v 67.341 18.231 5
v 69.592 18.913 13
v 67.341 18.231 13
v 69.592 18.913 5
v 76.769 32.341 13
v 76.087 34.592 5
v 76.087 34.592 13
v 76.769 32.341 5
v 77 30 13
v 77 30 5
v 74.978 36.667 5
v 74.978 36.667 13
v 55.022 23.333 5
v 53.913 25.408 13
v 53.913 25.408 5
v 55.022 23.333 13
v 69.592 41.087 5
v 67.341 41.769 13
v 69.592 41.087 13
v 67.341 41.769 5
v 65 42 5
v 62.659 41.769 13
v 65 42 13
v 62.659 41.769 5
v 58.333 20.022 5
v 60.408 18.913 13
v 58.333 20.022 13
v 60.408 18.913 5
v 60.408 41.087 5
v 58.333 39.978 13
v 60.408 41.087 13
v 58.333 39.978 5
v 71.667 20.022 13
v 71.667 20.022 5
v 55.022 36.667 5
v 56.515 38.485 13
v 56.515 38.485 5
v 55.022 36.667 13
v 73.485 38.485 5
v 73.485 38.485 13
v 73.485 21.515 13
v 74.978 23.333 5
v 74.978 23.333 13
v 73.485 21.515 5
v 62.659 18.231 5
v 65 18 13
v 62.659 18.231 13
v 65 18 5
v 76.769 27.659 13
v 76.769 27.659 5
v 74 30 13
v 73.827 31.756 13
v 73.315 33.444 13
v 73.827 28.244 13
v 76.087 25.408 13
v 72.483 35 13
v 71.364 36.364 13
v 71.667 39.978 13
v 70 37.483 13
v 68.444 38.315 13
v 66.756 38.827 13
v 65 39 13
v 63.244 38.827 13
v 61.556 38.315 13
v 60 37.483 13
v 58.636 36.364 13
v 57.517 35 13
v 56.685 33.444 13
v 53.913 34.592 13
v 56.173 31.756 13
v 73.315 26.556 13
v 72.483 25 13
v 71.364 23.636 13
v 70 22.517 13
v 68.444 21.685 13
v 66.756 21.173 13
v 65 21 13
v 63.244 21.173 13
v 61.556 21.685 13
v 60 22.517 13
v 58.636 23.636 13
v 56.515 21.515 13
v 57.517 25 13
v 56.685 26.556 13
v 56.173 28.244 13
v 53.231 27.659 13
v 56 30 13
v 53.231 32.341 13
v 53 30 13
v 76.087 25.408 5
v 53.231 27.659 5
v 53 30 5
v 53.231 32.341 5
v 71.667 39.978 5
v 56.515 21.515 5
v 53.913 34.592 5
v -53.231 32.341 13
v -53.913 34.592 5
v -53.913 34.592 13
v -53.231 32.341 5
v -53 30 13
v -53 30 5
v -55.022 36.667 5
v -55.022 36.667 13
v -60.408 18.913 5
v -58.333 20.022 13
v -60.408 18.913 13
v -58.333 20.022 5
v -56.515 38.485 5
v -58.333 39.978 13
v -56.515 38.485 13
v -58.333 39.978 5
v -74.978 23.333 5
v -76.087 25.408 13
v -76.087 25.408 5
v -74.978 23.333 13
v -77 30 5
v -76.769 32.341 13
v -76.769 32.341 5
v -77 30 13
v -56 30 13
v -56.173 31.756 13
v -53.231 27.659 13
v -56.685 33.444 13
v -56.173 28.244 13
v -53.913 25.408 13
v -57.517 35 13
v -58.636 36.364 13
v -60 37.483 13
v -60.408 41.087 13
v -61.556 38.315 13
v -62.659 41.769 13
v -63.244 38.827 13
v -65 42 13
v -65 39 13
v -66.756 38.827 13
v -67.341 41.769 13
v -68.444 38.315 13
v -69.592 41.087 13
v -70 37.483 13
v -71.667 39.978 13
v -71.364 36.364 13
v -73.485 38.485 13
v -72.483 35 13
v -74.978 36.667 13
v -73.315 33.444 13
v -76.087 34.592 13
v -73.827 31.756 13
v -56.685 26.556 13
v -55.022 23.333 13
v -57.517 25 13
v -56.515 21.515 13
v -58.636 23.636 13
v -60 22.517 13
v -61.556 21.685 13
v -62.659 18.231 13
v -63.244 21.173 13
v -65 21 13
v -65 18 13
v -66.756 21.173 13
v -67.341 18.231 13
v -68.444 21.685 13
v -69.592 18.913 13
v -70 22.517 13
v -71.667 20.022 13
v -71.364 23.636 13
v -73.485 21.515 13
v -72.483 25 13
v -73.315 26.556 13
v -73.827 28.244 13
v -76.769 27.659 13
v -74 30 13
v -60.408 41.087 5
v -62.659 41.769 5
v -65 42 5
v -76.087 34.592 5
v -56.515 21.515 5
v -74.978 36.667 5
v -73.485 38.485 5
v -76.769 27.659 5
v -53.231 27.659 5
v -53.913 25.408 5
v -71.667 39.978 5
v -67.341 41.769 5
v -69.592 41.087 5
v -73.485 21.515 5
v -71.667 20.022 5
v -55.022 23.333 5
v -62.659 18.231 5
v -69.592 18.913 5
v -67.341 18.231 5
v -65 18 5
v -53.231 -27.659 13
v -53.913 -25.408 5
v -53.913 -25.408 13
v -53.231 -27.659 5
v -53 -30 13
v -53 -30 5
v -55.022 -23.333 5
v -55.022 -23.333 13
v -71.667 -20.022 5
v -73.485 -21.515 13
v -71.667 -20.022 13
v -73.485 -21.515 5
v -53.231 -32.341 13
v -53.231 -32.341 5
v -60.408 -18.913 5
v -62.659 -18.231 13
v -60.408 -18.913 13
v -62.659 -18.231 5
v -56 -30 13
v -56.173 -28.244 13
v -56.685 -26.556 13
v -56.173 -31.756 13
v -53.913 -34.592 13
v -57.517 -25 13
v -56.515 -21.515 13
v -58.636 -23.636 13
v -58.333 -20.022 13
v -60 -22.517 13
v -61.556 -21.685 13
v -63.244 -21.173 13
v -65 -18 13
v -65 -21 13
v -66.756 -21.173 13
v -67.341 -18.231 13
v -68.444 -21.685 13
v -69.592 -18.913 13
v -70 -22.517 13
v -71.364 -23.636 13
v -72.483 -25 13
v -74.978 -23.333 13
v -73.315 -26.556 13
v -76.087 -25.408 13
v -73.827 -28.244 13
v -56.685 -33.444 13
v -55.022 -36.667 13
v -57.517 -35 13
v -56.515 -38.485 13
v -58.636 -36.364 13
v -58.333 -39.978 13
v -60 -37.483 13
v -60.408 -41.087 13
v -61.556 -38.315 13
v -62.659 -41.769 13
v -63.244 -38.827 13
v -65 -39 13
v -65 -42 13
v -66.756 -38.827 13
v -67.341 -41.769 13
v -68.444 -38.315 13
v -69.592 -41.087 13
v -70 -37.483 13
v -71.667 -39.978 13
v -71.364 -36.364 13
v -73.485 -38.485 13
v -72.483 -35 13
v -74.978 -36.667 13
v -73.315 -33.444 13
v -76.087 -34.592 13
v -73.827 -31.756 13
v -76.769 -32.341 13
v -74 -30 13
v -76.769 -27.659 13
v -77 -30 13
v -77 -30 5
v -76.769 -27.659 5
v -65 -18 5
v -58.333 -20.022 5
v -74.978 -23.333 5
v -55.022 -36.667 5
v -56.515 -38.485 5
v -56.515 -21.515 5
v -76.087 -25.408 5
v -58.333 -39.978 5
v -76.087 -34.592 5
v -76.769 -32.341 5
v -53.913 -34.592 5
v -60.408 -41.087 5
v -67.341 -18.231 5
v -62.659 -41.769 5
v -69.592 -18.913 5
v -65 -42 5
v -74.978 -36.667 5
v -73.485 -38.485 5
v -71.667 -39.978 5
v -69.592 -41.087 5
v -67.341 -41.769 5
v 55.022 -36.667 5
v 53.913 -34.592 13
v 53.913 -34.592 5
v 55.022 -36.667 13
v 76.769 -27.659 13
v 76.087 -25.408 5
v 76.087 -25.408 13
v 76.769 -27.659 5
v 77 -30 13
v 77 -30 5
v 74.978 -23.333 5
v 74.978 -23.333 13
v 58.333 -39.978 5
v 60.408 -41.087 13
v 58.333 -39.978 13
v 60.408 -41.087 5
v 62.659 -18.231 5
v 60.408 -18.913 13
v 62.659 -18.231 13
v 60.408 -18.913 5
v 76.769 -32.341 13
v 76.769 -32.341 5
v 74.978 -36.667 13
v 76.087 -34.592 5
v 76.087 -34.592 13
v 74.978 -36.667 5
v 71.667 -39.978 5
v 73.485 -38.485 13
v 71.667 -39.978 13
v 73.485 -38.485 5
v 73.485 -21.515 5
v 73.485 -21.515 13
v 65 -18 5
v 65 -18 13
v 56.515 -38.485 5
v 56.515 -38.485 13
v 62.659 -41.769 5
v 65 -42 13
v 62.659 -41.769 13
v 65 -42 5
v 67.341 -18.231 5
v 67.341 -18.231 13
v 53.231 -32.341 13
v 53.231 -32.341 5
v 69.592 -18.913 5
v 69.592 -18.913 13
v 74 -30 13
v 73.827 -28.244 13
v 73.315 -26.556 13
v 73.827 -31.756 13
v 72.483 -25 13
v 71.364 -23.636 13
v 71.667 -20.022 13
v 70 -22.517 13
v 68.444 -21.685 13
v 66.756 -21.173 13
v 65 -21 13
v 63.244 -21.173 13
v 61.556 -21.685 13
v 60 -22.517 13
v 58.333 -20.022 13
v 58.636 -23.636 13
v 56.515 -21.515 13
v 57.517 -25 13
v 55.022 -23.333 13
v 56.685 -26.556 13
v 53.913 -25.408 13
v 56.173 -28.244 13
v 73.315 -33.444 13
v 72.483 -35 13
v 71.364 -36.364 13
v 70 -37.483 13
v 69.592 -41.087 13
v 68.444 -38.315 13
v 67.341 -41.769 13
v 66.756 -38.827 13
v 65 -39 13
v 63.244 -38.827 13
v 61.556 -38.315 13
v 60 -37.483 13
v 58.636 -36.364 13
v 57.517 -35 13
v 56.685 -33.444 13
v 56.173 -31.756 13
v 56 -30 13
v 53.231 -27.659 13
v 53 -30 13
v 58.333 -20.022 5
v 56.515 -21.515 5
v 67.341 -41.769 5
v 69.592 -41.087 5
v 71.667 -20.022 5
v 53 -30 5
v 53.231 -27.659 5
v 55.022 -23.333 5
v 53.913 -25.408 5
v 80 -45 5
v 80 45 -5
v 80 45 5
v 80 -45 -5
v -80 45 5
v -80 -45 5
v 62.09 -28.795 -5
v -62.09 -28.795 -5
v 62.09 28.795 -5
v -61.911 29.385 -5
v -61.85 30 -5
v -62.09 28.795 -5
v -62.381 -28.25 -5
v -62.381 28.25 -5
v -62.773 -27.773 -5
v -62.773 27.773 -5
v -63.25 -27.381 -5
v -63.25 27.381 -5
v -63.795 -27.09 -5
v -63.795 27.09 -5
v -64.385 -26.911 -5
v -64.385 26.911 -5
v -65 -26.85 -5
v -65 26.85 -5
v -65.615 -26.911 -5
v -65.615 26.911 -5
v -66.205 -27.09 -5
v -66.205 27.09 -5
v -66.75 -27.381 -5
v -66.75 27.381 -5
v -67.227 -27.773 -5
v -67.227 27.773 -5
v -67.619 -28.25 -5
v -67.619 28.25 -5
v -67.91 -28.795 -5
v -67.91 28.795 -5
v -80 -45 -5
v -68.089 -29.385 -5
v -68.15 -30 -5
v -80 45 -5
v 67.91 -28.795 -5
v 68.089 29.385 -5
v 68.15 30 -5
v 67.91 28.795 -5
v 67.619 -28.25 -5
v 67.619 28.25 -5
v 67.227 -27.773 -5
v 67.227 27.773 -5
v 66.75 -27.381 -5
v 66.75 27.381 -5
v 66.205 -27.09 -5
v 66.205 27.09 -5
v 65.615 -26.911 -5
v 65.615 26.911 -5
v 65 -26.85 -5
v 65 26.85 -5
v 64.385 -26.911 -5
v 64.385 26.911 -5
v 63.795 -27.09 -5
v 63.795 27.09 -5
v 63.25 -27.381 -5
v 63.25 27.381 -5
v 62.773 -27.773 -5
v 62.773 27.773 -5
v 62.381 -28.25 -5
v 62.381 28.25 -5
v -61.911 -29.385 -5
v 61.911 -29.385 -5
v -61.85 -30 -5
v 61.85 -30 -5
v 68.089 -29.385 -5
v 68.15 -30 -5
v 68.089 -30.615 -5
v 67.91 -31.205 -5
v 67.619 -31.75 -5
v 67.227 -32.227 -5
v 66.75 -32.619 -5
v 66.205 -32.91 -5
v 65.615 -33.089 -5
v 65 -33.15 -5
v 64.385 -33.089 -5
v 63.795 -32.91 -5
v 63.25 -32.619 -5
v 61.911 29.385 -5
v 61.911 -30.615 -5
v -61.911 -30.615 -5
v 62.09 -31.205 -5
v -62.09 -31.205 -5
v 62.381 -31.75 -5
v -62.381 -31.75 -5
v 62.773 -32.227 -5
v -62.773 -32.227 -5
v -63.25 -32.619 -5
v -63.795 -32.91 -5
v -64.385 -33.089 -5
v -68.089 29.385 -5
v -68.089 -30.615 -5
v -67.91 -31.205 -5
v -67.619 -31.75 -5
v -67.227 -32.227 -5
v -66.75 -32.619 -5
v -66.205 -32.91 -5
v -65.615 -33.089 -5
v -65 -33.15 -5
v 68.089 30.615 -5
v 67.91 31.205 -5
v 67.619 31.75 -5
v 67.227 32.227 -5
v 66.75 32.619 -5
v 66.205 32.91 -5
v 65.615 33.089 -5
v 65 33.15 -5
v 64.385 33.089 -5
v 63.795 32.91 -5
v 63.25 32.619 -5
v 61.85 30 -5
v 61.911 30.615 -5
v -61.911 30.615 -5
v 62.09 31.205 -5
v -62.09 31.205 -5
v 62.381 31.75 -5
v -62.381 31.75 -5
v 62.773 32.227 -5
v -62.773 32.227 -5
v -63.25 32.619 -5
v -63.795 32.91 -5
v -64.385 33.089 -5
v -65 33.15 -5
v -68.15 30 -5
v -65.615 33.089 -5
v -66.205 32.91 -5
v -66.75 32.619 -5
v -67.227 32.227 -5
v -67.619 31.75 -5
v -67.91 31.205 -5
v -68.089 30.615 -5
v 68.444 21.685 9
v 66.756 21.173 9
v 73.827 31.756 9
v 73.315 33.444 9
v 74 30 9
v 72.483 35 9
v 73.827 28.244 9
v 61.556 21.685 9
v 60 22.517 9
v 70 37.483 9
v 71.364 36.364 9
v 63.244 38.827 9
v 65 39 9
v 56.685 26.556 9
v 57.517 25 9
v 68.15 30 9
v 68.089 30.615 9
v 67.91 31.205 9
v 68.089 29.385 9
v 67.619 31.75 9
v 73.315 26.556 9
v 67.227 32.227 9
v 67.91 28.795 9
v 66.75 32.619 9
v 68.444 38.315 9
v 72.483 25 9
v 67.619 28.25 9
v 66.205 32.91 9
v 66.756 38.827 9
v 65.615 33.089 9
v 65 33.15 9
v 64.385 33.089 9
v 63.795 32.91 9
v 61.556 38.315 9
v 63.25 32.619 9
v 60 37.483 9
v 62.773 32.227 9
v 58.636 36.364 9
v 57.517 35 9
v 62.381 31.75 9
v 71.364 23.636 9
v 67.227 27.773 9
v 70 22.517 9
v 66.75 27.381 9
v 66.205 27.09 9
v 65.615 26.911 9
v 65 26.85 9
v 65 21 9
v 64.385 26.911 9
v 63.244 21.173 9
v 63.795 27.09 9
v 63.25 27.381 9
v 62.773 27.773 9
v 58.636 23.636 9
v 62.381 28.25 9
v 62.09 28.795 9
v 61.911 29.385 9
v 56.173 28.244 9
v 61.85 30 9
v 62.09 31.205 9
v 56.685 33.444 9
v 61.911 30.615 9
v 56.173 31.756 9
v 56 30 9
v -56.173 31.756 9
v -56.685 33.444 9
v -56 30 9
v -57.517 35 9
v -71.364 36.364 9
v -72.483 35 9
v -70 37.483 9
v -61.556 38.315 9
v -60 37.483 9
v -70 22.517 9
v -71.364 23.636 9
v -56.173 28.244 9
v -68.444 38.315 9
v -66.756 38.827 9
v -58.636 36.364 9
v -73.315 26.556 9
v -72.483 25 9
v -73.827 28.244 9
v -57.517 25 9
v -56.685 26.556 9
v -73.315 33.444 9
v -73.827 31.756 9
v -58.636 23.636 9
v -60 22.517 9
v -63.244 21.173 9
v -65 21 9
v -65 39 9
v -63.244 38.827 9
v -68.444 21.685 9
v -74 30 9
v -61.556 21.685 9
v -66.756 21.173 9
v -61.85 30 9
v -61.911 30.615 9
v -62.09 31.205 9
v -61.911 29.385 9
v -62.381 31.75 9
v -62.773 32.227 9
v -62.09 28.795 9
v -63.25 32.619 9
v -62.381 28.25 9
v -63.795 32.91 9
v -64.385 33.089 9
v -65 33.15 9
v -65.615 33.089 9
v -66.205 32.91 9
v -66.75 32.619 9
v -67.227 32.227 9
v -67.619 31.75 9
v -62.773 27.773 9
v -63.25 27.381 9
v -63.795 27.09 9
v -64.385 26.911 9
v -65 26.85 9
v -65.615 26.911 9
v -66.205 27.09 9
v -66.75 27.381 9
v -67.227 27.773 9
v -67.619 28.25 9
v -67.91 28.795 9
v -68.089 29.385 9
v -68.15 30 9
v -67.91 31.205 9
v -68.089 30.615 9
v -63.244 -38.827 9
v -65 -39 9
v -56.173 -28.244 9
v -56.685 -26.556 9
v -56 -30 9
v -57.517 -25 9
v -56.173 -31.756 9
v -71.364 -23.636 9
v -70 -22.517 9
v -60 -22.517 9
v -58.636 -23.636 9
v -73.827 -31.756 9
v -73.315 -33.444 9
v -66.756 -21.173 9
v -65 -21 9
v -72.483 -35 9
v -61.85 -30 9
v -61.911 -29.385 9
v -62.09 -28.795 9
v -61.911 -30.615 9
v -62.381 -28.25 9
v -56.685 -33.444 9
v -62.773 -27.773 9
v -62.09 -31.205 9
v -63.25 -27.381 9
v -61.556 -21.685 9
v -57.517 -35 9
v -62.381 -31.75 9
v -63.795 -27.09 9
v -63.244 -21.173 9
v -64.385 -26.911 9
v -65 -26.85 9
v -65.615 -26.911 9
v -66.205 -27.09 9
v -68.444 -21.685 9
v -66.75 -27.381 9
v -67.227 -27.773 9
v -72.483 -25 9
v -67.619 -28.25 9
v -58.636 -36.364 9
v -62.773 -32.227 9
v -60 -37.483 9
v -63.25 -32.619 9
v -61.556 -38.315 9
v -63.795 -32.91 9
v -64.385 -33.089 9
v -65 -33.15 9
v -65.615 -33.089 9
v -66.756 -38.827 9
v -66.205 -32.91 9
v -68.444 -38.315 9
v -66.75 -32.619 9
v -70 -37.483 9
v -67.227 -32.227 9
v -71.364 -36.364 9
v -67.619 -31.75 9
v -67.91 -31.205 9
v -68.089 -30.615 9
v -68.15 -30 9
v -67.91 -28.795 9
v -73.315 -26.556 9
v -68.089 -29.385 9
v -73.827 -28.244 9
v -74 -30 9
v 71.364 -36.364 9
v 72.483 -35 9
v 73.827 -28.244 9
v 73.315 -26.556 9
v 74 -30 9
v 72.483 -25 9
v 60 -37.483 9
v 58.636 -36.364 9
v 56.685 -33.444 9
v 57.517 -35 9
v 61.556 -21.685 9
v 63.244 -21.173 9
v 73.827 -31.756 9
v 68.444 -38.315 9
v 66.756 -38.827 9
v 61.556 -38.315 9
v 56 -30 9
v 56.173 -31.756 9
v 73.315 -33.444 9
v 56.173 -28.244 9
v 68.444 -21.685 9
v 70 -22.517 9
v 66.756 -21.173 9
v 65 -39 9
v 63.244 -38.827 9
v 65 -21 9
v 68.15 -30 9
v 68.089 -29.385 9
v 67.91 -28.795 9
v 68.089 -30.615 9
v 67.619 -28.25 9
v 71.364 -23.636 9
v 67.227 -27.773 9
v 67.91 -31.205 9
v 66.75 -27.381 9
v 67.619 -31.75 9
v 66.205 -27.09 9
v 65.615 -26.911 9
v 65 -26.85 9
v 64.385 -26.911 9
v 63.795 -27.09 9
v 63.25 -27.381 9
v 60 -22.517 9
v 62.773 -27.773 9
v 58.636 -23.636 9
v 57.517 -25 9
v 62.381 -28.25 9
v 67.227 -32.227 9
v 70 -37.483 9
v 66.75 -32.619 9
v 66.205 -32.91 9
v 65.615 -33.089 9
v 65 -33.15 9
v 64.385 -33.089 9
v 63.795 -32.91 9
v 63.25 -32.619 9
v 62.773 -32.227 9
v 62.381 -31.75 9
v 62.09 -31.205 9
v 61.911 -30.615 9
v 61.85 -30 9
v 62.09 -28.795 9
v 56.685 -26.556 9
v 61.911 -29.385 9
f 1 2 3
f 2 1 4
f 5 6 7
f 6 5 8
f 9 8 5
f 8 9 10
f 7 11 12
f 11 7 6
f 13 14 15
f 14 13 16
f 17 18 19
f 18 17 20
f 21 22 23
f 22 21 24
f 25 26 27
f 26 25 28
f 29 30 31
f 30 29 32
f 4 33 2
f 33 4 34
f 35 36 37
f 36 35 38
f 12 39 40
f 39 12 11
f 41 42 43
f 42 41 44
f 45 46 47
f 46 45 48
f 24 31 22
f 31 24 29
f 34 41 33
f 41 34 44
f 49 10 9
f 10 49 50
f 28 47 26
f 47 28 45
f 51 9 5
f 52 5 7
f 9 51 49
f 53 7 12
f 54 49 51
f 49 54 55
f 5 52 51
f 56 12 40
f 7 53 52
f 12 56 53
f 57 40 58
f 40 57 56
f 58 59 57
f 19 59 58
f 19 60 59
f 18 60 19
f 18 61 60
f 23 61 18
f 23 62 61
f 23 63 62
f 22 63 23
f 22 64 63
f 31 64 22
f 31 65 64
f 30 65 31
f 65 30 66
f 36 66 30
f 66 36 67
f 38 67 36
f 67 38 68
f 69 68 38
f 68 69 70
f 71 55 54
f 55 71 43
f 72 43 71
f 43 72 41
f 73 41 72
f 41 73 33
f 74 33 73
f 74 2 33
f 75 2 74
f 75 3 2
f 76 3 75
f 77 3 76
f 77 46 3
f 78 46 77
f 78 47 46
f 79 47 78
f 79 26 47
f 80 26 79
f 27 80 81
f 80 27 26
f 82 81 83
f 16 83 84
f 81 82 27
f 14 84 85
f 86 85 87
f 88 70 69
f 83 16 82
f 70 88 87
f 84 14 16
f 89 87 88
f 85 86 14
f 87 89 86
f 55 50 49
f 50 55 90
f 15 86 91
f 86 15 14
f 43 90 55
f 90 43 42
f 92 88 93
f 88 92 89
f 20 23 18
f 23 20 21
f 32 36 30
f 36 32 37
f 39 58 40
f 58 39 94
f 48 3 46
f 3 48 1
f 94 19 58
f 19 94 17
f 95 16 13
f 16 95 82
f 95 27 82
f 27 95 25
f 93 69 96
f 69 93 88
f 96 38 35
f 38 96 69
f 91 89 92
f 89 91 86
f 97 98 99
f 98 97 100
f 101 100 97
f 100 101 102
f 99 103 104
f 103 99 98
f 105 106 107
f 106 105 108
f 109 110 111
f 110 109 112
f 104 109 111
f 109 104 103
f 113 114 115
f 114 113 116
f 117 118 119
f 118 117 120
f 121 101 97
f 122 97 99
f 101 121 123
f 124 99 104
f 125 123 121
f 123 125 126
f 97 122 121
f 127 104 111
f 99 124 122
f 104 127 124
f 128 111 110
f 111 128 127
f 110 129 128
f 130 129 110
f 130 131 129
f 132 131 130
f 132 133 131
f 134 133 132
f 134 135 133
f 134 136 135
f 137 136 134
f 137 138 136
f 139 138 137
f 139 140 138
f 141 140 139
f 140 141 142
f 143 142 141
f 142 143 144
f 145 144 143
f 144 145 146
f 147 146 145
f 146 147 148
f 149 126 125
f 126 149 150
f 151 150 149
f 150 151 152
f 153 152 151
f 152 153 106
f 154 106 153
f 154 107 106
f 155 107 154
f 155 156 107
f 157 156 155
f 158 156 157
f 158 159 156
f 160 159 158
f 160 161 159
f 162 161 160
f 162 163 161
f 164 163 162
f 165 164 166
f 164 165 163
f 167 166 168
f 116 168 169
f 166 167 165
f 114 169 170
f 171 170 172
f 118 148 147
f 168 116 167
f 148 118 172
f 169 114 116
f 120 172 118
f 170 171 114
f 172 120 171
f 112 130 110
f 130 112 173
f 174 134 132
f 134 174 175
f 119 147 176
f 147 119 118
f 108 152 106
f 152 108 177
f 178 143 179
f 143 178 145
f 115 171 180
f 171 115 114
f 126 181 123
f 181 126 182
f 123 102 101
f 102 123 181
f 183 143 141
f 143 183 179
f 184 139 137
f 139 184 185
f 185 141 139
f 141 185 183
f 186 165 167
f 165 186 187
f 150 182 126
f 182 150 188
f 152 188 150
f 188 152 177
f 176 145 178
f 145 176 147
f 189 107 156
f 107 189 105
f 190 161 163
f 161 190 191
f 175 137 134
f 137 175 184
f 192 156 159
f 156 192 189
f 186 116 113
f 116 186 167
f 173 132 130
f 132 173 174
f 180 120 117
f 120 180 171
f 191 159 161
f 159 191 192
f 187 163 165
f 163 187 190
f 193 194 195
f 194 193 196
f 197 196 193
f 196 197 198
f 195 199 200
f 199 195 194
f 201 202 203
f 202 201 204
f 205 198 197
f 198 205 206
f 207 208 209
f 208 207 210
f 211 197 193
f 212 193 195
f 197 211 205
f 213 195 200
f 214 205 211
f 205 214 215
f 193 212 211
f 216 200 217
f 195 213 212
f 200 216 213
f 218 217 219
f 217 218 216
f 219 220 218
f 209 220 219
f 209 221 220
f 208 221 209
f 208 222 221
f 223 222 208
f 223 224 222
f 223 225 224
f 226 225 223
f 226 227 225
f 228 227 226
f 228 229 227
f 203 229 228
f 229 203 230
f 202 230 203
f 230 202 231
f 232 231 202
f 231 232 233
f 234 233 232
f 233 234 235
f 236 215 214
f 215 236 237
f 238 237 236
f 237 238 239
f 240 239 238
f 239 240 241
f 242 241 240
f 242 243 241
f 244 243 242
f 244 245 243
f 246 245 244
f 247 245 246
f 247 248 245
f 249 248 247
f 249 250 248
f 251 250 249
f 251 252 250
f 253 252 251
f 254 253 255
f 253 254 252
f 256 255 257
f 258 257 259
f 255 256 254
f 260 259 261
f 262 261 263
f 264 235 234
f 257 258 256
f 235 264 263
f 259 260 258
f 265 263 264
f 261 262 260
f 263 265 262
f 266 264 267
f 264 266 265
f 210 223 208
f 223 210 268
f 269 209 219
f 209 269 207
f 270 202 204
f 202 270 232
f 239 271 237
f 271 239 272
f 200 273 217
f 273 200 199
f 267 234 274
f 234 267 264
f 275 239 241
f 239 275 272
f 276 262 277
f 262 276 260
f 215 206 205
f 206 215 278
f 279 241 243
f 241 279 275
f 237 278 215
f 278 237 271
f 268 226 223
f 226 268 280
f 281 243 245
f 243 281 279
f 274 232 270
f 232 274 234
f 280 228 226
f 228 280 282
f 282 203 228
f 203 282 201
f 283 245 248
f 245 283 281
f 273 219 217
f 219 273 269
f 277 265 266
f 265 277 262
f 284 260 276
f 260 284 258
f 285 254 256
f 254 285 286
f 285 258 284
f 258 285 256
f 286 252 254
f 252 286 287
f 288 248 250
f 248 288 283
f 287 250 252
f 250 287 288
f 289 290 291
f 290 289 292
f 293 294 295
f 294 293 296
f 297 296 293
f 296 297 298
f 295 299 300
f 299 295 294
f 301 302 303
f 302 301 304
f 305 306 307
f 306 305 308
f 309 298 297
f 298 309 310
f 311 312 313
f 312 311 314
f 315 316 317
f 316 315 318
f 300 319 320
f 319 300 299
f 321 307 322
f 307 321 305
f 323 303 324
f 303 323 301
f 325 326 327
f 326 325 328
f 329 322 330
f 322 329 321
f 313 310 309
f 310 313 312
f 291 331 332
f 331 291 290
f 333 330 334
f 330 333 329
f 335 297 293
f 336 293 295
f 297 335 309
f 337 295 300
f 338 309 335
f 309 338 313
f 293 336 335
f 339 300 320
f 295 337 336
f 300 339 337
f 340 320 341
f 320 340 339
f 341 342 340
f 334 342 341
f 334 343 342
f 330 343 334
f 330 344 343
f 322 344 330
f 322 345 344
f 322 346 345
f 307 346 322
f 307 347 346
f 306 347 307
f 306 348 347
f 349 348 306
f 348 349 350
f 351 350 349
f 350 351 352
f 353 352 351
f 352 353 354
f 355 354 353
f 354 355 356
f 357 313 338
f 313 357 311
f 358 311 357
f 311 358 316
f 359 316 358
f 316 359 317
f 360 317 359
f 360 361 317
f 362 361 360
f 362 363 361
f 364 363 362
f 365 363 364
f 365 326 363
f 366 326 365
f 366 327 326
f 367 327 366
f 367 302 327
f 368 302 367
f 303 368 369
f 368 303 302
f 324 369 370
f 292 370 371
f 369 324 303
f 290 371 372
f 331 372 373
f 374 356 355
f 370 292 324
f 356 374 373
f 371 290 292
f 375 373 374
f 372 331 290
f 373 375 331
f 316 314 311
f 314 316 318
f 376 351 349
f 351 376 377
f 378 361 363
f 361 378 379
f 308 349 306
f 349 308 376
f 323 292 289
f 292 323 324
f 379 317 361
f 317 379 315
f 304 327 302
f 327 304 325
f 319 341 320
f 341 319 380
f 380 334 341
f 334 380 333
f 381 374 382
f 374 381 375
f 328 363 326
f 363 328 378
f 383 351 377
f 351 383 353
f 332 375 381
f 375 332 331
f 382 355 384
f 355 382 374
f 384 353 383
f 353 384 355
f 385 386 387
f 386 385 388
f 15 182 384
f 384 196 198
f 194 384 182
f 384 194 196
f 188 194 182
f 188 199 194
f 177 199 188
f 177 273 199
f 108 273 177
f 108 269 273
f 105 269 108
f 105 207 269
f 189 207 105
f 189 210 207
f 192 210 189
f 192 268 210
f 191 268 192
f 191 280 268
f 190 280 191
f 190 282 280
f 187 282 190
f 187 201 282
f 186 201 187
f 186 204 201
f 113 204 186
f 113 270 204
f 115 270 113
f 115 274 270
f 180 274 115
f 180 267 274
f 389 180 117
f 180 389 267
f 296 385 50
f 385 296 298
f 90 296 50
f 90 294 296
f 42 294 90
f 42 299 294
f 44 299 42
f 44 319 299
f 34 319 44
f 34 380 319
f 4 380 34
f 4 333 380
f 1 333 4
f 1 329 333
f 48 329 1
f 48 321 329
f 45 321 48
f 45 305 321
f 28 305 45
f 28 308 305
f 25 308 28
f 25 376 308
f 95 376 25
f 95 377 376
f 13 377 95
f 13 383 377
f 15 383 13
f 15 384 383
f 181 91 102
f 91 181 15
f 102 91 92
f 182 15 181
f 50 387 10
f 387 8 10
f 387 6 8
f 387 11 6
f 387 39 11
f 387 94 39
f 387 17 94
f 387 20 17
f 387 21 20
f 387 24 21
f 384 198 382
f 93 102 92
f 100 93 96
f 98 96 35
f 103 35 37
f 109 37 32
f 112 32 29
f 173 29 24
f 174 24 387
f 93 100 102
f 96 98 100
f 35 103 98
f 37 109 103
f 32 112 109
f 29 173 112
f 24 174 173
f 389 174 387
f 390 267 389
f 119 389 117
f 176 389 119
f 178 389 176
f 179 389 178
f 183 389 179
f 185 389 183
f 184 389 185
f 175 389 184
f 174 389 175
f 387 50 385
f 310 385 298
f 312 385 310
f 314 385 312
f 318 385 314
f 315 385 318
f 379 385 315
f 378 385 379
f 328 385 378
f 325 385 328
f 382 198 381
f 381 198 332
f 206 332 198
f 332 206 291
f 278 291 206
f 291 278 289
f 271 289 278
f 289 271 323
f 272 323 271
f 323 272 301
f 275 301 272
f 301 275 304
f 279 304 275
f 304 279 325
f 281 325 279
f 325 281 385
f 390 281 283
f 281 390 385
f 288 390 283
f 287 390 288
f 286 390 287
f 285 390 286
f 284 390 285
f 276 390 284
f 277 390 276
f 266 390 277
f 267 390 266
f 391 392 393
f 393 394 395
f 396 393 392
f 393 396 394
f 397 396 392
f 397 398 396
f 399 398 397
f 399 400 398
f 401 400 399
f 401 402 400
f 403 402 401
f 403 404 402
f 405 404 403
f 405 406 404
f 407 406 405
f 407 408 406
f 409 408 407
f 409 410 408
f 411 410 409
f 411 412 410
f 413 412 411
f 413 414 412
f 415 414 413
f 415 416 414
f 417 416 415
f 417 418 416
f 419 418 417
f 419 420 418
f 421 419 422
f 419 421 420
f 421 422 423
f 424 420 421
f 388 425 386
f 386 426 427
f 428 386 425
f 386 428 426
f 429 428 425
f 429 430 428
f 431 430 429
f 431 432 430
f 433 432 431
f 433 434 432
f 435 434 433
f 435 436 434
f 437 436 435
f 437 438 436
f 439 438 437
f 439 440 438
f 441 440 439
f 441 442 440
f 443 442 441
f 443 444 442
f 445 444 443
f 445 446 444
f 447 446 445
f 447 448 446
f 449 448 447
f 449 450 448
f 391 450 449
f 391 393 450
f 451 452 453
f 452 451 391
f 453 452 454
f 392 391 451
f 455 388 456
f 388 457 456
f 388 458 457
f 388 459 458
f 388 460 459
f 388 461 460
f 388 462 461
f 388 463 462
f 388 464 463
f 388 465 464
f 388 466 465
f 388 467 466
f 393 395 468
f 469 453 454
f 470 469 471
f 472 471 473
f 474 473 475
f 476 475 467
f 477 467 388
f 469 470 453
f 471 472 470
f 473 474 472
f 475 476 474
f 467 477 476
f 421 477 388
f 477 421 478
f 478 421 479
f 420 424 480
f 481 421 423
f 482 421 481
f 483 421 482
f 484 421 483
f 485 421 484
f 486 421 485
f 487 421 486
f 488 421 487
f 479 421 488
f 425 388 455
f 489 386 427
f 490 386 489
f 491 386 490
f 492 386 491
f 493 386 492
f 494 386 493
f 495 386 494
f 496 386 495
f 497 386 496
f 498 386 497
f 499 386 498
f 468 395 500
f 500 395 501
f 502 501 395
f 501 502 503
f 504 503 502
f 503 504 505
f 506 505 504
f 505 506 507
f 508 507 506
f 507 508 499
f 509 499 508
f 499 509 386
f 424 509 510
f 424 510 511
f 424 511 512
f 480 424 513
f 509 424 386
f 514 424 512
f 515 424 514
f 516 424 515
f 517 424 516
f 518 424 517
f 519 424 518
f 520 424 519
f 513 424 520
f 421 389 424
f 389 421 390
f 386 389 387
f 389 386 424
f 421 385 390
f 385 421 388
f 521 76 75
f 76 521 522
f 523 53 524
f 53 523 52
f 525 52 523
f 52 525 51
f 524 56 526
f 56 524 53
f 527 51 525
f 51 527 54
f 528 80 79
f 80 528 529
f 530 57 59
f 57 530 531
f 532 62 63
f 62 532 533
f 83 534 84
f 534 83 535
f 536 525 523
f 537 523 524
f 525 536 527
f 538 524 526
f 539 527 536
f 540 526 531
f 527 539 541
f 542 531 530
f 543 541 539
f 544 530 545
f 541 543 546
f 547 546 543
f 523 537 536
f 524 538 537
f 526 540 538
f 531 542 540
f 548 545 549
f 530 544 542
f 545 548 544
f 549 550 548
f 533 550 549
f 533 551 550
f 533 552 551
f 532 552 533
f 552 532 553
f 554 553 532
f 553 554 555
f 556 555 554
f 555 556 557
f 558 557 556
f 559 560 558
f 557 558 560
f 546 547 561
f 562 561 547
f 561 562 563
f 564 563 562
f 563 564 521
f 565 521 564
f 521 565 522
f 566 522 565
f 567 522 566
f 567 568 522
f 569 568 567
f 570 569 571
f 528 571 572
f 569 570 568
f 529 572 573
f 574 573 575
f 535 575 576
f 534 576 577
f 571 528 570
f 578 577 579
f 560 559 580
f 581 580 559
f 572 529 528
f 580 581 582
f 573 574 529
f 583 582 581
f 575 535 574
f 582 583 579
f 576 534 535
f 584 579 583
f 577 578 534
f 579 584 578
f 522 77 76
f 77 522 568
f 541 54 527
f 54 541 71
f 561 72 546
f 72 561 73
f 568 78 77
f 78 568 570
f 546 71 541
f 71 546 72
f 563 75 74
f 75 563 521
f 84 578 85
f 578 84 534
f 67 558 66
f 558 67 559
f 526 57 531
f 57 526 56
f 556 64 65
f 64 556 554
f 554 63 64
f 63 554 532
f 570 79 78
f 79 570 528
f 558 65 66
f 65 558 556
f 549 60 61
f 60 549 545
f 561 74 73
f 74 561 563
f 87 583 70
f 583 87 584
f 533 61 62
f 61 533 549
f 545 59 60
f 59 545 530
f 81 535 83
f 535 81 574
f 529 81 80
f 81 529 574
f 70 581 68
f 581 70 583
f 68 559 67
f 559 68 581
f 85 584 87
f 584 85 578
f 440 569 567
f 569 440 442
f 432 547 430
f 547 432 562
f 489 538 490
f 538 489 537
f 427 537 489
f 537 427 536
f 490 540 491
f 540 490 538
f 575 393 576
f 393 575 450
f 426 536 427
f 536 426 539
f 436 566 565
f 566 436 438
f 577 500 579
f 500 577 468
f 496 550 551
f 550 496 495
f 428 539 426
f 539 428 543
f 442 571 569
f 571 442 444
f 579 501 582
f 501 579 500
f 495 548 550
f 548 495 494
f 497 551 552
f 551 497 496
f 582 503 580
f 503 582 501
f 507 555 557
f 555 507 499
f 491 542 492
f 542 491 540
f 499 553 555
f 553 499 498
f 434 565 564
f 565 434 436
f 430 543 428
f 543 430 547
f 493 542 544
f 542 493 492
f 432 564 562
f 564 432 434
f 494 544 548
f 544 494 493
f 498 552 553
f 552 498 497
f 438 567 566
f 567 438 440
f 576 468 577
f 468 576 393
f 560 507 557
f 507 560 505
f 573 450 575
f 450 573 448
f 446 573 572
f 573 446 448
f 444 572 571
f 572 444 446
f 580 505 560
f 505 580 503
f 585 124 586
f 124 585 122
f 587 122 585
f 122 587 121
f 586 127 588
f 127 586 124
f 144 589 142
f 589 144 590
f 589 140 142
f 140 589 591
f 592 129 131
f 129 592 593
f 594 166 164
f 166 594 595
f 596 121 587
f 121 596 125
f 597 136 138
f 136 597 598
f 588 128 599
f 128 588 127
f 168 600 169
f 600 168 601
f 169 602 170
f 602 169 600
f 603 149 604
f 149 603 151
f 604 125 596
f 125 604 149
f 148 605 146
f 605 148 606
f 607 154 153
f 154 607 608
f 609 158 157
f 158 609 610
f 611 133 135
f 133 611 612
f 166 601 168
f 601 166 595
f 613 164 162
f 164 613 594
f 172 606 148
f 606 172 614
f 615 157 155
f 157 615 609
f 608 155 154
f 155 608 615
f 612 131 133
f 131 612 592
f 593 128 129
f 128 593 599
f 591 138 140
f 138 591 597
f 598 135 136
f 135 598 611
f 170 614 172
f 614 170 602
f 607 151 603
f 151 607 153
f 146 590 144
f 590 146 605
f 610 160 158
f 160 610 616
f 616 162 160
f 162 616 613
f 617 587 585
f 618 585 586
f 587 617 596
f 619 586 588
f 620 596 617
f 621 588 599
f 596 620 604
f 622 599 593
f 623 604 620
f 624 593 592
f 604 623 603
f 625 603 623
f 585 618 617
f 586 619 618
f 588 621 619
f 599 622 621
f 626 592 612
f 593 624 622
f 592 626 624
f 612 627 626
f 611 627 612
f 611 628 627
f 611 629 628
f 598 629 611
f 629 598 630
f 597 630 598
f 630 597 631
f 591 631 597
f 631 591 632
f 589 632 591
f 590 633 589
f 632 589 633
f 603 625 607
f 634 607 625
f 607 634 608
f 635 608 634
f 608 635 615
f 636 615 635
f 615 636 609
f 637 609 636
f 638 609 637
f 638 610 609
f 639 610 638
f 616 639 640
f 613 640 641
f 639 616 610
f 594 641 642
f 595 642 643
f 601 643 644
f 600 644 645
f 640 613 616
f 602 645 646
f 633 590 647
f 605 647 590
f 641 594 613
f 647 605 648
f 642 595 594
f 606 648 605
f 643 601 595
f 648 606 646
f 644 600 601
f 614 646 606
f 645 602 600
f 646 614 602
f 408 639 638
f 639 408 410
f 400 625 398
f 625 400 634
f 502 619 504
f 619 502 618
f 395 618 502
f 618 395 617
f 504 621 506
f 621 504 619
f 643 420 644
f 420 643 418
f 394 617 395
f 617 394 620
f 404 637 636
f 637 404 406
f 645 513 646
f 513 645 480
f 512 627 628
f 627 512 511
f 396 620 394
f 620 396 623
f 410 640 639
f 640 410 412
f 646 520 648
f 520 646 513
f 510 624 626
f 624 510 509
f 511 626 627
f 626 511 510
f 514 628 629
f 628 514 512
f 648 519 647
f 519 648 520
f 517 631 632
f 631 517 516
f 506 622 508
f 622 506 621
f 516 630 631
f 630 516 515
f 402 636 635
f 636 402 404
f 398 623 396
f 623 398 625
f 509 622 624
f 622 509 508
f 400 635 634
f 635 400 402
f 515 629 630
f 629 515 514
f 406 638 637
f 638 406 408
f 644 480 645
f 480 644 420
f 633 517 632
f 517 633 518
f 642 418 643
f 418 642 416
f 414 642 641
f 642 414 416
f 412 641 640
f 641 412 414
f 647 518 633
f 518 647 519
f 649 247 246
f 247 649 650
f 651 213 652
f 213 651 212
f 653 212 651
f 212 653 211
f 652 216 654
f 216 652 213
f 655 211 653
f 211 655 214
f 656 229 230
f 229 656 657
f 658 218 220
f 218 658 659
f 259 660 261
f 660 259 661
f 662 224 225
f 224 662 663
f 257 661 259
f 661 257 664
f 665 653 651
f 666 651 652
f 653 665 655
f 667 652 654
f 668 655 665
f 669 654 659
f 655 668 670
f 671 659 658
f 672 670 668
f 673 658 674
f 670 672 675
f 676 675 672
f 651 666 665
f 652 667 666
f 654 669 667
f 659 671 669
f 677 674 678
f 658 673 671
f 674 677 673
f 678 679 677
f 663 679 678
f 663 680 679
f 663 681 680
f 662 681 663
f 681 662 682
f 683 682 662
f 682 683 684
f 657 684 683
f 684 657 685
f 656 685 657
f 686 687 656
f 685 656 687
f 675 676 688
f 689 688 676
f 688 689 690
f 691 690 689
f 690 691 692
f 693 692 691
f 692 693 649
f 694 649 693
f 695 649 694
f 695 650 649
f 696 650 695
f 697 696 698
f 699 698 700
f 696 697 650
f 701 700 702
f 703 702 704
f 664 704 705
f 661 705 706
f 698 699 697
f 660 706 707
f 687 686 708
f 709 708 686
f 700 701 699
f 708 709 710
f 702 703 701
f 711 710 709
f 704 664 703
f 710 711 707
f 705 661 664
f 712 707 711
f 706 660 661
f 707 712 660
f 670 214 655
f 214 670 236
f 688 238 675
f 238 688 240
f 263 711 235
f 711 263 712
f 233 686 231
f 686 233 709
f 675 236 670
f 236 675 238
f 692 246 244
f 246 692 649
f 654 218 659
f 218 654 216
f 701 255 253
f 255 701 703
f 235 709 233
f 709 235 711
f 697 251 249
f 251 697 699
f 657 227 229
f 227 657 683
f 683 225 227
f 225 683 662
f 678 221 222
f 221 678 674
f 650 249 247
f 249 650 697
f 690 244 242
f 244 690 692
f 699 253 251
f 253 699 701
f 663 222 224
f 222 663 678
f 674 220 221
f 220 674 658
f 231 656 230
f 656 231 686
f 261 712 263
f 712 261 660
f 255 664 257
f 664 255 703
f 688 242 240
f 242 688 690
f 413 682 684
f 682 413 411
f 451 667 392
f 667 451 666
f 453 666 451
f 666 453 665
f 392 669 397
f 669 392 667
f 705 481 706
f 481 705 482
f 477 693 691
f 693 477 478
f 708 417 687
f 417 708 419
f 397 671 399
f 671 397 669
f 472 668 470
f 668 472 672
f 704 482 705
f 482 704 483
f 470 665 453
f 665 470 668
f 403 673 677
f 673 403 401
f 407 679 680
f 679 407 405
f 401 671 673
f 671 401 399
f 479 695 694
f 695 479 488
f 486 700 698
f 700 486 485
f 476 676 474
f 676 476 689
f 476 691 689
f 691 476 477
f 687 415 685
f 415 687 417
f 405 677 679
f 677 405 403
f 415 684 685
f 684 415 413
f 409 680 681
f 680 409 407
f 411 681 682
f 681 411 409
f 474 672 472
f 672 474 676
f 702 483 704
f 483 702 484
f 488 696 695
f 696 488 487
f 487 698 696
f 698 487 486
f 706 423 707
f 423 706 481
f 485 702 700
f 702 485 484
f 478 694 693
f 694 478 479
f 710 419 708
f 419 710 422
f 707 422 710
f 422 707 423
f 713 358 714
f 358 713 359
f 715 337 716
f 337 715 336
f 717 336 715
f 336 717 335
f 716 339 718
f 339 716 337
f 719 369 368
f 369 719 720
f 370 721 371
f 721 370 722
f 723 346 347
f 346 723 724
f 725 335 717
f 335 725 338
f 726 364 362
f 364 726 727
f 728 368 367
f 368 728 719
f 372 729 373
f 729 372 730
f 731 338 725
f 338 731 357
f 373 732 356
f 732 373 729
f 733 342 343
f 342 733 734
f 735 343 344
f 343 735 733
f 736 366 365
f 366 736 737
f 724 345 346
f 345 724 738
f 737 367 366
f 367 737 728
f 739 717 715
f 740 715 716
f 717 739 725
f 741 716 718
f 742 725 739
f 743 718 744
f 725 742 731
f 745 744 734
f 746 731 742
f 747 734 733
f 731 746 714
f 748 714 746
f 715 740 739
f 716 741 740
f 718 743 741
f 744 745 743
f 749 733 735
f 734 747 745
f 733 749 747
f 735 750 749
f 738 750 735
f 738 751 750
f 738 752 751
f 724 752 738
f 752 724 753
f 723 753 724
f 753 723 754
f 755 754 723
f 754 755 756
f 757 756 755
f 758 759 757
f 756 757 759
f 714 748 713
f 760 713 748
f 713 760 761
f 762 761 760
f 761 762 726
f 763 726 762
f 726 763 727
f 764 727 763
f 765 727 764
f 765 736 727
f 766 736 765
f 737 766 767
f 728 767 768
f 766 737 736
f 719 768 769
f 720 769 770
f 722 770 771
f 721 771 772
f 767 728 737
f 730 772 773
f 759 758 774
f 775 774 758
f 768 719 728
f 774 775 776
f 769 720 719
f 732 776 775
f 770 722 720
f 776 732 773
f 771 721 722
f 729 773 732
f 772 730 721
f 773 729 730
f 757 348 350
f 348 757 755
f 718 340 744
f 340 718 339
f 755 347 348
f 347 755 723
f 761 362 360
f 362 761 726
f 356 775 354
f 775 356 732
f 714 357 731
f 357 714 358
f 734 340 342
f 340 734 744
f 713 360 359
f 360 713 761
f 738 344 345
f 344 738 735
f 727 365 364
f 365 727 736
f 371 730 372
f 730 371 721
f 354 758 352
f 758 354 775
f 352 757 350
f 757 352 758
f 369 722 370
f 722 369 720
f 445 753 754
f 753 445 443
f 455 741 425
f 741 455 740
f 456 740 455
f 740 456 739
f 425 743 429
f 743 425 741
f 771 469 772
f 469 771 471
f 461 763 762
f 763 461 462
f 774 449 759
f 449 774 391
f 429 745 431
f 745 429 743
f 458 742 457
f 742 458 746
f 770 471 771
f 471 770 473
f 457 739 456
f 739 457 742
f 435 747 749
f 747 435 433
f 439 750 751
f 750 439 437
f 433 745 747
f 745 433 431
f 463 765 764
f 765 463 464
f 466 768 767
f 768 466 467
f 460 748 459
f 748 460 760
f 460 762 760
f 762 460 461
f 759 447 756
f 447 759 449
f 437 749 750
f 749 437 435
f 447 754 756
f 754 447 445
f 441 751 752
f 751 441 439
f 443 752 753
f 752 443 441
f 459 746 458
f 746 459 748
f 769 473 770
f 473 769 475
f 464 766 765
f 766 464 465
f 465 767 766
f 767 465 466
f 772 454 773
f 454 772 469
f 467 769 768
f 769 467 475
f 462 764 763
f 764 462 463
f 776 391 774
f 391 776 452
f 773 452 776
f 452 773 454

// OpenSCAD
$fn = 32;

// ----------------------------------------------------------------------
// Socket pad plate
// bosses with counterbored sockets for the screws
// ----------------------------------------------------------------------

// --- parameters (mm) ---
base_t = 10;            // base plate thickness
boss_h = 8;             // boss height above the base plate
boss_d = 24;            // boss diameter
socket_d = 18;          // socket diameter
socket_depth = 4;       // socket depth from the boss face
bolt_d = 6.3;           // screw clearance hole through the socket floor
plate = [160, 90, 10];  // overall size (x, y, z)
edge = 15;              // boss centre offset from the plate edge
pads = 4;               // boss count, one per corner

// --- derived feature positions (mm) ---
height = base_t + boss_h;        // = 18   overall height of the part
corner_x = plate[0] / 2 - edge;  // = 65   boss centre X
corner_y = plate[1] / 2 - edge;  // = 30   boss centre Y
feature_centers = [
  [corner_x, corner_y],
  [-corner_x, corner_y],
  [-corner_x, -corner_y],
  [corner_x, -corner_y]
];   // boss centres: sockets, holes and the pads themselves are placed from here

// base plate, bosses on feature_centers, socket + through hole in each
difference() {
  union() {
    cube(plate, center = true);
    for (centre = feature_centers)
      translate([centre[0], centre[1], plate[2] / 2 - 1])
        cylinder(d = boss_d, h = boss_h + 1);
  }
  for (centre = feature_centers) {
    translate([centre[0], centre[1], plate[2] / 2 + boss_h - socket_depth])
      cylinder(d = socket_d, h = socket_depth + 1);
    translate([centre[0], centre[1], -height])
      cylinder(d = bolt_d, h = 2 * height + 2);  // through the socket floor
  }
}
